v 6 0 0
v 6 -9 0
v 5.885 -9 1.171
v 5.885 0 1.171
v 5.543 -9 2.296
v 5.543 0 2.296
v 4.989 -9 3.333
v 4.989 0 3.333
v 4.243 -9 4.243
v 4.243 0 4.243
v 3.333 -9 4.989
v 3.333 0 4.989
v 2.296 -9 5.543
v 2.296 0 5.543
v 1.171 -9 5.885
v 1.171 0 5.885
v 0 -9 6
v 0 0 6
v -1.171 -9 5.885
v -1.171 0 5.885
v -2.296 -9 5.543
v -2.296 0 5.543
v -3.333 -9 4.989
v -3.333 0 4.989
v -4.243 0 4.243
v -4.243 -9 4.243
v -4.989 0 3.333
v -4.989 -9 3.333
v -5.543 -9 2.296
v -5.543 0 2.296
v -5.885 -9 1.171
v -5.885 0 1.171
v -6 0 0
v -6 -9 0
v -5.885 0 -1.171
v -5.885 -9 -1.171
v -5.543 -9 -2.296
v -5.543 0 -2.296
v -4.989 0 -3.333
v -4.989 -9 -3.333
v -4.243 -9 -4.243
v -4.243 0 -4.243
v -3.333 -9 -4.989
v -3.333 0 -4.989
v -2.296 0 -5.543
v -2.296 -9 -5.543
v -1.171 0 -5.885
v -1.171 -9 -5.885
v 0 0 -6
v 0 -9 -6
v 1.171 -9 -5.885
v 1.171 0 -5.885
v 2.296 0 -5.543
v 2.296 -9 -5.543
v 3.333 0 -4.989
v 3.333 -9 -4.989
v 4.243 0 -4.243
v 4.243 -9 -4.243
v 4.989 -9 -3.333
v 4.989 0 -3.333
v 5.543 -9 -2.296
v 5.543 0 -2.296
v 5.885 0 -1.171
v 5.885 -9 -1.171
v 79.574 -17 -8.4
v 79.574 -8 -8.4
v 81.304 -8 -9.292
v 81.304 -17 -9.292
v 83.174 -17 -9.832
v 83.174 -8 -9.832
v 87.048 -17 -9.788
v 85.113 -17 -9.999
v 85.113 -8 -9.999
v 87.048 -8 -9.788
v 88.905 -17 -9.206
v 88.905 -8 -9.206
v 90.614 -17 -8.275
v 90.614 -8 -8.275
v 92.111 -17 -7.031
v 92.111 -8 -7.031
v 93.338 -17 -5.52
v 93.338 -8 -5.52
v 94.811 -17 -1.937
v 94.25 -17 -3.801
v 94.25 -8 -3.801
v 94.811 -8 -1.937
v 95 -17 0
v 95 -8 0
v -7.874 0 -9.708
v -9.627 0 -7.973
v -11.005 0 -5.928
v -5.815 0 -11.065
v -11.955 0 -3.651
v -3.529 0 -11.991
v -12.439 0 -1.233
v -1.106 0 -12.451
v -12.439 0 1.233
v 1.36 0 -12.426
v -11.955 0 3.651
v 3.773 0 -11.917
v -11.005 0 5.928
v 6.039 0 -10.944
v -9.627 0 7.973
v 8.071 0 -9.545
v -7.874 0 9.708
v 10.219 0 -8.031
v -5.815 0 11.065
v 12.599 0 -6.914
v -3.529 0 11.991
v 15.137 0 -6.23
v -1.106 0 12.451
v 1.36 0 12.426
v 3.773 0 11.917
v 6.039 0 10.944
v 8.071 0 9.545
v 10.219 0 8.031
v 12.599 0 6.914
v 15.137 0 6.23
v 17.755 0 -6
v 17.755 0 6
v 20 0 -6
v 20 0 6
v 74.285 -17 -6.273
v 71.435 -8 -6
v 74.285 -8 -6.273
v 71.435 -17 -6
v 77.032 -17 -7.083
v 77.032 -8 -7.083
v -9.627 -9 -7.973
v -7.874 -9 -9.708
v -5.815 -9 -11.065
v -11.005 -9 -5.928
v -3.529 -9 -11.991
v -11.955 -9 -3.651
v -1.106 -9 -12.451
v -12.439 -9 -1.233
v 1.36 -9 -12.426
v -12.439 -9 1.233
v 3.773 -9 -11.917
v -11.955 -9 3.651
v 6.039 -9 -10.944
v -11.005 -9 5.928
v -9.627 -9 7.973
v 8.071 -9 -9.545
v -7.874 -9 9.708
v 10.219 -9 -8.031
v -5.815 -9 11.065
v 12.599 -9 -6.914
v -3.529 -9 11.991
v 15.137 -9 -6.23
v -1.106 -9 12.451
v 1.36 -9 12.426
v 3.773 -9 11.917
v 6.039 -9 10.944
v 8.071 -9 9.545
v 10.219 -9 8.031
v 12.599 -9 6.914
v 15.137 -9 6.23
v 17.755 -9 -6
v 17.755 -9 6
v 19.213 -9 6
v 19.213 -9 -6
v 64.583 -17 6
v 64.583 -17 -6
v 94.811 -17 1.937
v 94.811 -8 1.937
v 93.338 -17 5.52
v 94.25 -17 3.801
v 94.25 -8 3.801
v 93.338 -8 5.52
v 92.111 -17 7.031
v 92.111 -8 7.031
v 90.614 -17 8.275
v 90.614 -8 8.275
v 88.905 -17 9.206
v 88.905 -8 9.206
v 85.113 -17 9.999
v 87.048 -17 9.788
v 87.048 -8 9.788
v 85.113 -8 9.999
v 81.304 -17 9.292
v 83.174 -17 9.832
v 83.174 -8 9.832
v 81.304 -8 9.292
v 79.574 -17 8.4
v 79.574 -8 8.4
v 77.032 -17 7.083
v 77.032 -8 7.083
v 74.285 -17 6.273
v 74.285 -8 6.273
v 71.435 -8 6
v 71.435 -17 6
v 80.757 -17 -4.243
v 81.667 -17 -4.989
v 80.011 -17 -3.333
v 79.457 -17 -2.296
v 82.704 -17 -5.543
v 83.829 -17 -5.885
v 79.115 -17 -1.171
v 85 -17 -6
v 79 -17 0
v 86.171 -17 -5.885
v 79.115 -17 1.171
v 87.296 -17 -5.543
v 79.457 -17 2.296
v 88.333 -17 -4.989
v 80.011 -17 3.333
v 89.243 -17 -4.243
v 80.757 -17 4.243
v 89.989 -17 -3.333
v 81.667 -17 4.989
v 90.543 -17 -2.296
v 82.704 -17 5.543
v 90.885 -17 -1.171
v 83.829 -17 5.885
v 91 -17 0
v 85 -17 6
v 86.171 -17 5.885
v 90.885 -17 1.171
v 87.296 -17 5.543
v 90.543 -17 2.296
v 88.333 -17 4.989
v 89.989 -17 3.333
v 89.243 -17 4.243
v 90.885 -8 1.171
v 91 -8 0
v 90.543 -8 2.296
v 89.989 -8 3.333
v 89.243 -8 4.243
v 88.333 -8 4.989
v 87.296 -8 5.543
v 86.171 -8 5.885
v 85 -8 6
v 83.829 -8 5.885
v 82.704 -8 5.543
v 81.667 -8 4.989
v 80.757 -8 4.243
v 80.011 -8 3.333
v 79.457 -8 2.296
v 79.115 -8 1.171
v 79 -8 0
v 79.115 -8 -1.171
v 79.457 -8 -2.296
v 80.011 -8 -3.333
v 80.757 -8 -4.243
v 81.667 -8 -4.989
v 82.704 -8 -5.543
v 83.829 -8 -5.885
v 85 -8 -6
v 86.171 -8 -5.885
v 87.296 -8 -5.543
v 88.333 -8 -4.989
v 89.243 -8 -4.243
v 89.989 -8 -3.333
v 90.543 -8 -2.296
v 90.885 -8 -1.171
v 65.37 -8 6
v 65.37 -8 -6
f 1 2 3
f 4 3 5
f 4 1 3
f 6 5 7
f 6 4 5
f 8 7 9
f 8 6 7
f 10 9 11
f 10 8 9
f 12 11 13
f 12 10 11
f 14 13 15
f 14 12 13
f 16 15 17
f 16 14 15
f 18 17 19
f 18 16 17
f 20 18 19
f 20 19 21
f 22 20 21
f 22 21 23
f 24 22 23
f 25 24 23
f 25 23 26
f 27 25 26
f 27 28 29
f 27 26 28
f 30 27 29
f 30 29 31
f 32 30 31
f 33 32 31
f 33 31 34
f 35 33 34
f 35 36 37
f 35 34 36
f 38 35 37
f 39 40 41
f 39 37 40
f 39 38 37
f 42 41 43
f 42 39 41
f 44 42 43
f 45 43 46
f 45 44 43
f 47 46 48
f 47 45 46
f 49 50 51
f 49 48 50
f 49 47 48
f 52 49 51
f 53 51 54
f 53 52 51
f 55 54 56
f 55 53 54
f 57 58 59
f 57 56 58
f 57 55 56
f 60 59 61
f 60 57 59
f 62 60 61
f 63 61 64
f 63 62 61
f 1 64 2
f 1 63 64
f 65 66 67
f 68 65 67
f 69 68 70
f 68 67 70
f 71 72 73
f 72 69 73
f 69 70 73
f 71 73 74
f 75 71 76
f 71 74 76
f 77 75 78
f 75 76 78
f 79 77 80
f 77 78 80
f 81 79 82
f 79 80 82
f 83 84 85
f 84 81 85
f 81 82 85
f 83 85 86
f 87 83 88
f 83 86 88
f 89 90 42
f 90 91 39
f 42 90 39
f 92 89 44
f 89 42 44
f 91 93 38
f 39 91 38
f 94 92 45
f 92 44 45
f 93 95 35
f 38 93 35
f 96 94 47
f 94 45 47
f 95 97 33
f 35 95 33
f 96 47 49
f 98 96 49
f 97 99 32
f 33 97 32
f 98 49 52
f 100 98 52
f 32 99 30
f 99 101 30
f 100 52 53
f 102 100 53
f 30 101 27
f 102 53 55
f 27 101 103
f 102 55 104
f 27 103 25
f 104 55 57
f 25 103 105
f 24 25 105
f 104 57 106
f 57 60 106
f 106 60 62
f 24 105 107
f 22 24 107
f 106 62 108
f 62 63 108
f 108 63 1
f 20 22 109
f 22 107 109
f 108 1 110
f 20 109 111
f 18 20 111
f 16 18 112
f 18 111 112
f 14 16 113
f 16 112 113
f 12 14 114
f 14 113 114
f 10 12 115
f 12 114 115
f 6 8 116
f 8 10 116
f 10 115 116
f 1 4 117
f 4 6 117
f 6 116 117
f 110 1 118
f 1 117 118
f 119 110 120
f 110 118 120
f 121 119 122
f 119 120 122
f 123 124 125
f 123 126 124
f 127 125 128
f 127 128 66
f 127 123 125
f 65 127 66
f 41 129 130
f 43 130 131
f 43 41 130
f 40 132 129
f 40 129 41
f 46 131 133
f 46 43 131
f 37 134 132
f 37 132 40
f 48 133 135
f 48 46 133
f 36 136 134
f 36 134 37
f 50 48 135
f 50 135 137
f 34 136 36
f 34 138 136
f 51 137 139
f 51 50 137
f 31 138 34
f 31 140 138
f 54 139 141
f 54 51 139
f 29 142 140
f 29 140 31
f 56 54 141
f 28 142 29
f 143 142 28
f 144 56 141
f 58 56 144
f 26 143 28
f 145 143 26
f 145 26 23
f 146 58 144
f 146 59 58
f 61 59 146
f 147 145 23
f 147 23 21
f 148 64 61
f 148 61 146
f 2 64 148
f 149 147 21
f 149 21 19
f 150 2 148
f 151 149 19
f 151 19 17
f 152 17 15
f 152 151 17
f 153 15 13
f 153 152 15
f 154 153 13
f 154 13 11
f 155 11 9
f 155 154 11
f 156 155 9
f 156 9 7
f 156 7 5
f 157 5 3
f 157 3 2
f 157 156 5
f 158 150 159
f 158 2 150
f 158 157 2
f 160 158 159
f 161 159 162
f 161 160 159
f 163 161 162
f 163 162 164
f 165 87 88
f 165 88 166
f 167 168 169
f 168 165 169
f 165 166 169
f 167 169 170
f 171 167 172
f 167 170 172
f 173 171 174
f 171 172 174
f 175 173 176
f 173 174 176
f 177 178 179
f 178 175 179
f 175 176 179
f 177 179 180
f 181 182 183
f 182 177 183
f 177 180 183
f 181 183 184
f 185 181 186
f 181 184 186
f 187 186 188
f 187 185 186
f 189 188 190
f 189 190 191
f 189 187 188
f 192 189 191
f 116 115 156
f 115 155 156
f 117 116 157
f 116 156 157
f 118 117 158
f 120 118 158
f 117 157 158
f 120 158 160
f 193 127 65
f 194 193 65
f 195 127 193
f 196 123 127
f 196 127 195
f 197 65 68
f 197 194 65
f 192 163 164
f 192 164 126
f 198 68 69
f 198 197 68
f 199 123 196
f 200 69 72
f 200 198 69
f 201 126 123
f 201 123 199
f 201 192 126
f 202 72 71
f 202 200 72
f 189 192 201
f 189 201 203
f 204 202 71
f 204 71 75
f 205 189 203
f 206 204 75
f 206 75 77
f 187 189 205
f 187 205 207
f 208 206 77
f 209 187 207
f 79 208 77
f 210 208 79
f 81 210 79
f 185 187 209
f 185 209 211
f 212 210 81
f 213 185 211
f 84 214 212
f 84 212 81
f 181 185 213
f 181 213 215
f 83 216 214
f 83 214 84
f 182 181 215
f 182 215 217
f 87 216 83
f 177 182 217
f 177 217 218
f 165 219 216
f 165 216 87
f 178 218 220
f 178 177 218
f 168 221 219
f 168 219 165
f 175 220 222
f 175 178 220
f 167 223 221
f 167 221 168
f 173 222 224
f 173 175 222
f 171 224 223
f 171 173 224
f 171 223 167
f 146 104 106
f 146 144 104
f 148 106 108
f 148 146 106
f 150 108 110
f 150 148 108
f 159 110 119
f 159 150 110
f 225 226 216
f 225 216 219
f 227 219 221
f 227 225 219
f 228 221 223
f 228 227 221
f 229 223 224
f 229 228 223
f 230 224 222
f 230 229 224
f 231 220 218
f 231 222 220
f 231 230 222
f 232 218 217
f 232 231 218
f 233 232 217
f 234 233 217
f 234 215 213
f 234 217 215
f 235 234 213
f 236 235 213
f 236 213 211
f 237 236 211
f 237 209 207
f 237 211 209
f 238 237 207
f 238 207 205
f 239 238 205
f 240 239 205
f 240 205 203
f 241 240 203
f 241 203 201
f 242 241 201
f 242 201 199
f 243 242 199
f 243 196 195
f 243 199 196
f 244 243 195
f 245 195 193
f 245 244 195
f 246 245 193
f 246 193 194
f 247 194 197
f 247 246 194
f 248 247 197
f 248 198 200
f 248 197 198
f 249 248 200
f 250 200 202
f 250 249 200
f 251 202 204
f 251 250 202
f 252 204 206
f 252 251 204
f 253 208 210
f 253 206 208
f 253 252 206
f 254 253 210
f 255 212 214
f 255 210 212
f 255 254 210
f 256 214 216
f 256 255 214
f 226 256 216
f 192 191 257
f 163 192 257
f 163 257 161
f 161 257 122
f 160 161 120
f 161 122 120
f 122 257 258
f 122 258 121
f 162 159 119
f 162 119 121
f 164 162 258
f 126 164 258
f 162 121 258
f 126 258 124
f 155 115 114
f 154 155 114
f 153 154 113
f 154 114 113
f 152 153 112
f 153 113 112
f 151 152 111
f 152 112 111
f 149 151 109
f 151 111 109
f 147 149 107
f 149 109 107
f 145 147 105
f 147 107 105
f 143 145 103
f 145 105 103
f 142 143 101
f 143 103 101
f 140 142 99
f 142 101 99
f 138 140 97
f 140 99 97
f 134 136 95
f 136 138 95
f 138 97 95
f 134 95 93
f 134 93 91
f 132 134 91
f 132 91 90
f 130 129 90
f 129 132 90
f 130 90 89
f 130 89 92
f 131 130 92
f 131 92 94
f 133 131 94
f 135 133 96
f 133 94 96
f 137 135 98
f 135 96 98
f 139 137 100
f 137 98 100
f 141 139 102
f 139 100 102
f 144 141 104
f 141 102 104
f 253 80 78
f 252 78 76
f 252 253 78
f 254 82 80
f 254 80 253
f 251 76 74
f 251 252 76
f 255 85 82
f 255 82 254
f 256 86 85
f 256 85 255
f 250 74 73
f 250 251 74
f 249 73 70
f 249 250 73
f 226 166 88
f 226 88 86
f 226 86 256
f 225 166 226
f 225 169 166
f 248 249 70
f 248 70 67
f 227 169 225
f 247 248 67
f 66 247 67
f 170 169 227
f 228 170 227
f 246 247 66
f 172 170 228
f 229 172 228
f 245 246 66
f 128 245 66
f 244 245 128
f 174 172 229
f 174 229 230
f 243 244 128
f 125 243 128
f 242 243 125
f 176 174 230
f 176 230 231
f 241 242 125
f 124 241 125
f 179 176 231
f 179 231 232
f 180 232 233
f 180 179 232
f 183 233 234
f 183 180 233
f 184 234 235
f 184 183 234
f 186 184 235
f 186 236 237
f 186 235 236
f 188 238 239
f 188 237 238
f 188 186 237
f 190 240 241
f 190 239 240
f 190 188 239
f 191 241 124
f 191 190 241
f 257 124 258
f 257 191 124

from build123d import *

# Parameters (mm, degrees)
F0_R     = 6
F1_DEPTH = 25
F3_DEPTH = 12.5
F4_R     = 15


with BuildPart() as f1:
    # F0 (on Front) → F1 (new body)
    with BuildSketch(Plane.XZ):
        with BuildLine():
            ThreePointArc((10.965856, -6), (12.110392, -3.096514), (12.5, 0))
            ThreePointArc((12.5, 0), (12.110392, 3.096514), (10.965856, 6))
            ThreePointArc((10.965856, 6), (-12.5, 0), (10.965856, -6))
        make_face()
        Circle(F0_R, mode=Mode.SUBTRACT)
        with BuildLine():
            ThreePointArc((10.965856, 6), (12.110392, 3.096514), (12.5, 0))
            ThreePointArc((12.5, 0), (12.110392, -3.096514), (10.965856, -6))
            Line((10.965856, -6), (77, -6))
            ThreePointArc((77, -6), (75, 0), (77, 6))
            Line((77, 6), (10.965856, 6))
        make_face()
        with BuildLine():
            ThreePointArc((95, 0), (88.162278, 9.486833), (77, 6))
            ThreePointArc((77, 6), (75, 0), (77, -6))
            ThreePointArc((77, -6), (88.162278, -9.486833), (95, 0))
        make_face()
        with Locations((85, 0)):
            Circle(F0_R, mode=Mode.SUBTRACT)
    extrude(amount=F1_DEPTH)

    # F2 (on Top) → F3 (intersect, symmetric)
    with BuildSketch(Plane.XY):
        Polygon((0, 0), (-12.5, 0), (-12.5, -9), (0, -9), (19.212602, -9), (64.582857, -17), (95, -17), (95, -8), (65.370255, -8), (20, 0), align=None)
    extrude(amount=F3_DEPTH, both=True, mode=Mode.INTERSECT)

    # F4
    f4_edges = [f1.edges().sort_by_distance(p)[0] for p in [
        (10.965856, -4.5, -6),
        (10.965856, -4.5, 6),
        (77, -12.5, 6),
        (77, -12.5, -6),
    ]]
    fillet(f4_edges, radius=F4_R)


solid = f1.part
